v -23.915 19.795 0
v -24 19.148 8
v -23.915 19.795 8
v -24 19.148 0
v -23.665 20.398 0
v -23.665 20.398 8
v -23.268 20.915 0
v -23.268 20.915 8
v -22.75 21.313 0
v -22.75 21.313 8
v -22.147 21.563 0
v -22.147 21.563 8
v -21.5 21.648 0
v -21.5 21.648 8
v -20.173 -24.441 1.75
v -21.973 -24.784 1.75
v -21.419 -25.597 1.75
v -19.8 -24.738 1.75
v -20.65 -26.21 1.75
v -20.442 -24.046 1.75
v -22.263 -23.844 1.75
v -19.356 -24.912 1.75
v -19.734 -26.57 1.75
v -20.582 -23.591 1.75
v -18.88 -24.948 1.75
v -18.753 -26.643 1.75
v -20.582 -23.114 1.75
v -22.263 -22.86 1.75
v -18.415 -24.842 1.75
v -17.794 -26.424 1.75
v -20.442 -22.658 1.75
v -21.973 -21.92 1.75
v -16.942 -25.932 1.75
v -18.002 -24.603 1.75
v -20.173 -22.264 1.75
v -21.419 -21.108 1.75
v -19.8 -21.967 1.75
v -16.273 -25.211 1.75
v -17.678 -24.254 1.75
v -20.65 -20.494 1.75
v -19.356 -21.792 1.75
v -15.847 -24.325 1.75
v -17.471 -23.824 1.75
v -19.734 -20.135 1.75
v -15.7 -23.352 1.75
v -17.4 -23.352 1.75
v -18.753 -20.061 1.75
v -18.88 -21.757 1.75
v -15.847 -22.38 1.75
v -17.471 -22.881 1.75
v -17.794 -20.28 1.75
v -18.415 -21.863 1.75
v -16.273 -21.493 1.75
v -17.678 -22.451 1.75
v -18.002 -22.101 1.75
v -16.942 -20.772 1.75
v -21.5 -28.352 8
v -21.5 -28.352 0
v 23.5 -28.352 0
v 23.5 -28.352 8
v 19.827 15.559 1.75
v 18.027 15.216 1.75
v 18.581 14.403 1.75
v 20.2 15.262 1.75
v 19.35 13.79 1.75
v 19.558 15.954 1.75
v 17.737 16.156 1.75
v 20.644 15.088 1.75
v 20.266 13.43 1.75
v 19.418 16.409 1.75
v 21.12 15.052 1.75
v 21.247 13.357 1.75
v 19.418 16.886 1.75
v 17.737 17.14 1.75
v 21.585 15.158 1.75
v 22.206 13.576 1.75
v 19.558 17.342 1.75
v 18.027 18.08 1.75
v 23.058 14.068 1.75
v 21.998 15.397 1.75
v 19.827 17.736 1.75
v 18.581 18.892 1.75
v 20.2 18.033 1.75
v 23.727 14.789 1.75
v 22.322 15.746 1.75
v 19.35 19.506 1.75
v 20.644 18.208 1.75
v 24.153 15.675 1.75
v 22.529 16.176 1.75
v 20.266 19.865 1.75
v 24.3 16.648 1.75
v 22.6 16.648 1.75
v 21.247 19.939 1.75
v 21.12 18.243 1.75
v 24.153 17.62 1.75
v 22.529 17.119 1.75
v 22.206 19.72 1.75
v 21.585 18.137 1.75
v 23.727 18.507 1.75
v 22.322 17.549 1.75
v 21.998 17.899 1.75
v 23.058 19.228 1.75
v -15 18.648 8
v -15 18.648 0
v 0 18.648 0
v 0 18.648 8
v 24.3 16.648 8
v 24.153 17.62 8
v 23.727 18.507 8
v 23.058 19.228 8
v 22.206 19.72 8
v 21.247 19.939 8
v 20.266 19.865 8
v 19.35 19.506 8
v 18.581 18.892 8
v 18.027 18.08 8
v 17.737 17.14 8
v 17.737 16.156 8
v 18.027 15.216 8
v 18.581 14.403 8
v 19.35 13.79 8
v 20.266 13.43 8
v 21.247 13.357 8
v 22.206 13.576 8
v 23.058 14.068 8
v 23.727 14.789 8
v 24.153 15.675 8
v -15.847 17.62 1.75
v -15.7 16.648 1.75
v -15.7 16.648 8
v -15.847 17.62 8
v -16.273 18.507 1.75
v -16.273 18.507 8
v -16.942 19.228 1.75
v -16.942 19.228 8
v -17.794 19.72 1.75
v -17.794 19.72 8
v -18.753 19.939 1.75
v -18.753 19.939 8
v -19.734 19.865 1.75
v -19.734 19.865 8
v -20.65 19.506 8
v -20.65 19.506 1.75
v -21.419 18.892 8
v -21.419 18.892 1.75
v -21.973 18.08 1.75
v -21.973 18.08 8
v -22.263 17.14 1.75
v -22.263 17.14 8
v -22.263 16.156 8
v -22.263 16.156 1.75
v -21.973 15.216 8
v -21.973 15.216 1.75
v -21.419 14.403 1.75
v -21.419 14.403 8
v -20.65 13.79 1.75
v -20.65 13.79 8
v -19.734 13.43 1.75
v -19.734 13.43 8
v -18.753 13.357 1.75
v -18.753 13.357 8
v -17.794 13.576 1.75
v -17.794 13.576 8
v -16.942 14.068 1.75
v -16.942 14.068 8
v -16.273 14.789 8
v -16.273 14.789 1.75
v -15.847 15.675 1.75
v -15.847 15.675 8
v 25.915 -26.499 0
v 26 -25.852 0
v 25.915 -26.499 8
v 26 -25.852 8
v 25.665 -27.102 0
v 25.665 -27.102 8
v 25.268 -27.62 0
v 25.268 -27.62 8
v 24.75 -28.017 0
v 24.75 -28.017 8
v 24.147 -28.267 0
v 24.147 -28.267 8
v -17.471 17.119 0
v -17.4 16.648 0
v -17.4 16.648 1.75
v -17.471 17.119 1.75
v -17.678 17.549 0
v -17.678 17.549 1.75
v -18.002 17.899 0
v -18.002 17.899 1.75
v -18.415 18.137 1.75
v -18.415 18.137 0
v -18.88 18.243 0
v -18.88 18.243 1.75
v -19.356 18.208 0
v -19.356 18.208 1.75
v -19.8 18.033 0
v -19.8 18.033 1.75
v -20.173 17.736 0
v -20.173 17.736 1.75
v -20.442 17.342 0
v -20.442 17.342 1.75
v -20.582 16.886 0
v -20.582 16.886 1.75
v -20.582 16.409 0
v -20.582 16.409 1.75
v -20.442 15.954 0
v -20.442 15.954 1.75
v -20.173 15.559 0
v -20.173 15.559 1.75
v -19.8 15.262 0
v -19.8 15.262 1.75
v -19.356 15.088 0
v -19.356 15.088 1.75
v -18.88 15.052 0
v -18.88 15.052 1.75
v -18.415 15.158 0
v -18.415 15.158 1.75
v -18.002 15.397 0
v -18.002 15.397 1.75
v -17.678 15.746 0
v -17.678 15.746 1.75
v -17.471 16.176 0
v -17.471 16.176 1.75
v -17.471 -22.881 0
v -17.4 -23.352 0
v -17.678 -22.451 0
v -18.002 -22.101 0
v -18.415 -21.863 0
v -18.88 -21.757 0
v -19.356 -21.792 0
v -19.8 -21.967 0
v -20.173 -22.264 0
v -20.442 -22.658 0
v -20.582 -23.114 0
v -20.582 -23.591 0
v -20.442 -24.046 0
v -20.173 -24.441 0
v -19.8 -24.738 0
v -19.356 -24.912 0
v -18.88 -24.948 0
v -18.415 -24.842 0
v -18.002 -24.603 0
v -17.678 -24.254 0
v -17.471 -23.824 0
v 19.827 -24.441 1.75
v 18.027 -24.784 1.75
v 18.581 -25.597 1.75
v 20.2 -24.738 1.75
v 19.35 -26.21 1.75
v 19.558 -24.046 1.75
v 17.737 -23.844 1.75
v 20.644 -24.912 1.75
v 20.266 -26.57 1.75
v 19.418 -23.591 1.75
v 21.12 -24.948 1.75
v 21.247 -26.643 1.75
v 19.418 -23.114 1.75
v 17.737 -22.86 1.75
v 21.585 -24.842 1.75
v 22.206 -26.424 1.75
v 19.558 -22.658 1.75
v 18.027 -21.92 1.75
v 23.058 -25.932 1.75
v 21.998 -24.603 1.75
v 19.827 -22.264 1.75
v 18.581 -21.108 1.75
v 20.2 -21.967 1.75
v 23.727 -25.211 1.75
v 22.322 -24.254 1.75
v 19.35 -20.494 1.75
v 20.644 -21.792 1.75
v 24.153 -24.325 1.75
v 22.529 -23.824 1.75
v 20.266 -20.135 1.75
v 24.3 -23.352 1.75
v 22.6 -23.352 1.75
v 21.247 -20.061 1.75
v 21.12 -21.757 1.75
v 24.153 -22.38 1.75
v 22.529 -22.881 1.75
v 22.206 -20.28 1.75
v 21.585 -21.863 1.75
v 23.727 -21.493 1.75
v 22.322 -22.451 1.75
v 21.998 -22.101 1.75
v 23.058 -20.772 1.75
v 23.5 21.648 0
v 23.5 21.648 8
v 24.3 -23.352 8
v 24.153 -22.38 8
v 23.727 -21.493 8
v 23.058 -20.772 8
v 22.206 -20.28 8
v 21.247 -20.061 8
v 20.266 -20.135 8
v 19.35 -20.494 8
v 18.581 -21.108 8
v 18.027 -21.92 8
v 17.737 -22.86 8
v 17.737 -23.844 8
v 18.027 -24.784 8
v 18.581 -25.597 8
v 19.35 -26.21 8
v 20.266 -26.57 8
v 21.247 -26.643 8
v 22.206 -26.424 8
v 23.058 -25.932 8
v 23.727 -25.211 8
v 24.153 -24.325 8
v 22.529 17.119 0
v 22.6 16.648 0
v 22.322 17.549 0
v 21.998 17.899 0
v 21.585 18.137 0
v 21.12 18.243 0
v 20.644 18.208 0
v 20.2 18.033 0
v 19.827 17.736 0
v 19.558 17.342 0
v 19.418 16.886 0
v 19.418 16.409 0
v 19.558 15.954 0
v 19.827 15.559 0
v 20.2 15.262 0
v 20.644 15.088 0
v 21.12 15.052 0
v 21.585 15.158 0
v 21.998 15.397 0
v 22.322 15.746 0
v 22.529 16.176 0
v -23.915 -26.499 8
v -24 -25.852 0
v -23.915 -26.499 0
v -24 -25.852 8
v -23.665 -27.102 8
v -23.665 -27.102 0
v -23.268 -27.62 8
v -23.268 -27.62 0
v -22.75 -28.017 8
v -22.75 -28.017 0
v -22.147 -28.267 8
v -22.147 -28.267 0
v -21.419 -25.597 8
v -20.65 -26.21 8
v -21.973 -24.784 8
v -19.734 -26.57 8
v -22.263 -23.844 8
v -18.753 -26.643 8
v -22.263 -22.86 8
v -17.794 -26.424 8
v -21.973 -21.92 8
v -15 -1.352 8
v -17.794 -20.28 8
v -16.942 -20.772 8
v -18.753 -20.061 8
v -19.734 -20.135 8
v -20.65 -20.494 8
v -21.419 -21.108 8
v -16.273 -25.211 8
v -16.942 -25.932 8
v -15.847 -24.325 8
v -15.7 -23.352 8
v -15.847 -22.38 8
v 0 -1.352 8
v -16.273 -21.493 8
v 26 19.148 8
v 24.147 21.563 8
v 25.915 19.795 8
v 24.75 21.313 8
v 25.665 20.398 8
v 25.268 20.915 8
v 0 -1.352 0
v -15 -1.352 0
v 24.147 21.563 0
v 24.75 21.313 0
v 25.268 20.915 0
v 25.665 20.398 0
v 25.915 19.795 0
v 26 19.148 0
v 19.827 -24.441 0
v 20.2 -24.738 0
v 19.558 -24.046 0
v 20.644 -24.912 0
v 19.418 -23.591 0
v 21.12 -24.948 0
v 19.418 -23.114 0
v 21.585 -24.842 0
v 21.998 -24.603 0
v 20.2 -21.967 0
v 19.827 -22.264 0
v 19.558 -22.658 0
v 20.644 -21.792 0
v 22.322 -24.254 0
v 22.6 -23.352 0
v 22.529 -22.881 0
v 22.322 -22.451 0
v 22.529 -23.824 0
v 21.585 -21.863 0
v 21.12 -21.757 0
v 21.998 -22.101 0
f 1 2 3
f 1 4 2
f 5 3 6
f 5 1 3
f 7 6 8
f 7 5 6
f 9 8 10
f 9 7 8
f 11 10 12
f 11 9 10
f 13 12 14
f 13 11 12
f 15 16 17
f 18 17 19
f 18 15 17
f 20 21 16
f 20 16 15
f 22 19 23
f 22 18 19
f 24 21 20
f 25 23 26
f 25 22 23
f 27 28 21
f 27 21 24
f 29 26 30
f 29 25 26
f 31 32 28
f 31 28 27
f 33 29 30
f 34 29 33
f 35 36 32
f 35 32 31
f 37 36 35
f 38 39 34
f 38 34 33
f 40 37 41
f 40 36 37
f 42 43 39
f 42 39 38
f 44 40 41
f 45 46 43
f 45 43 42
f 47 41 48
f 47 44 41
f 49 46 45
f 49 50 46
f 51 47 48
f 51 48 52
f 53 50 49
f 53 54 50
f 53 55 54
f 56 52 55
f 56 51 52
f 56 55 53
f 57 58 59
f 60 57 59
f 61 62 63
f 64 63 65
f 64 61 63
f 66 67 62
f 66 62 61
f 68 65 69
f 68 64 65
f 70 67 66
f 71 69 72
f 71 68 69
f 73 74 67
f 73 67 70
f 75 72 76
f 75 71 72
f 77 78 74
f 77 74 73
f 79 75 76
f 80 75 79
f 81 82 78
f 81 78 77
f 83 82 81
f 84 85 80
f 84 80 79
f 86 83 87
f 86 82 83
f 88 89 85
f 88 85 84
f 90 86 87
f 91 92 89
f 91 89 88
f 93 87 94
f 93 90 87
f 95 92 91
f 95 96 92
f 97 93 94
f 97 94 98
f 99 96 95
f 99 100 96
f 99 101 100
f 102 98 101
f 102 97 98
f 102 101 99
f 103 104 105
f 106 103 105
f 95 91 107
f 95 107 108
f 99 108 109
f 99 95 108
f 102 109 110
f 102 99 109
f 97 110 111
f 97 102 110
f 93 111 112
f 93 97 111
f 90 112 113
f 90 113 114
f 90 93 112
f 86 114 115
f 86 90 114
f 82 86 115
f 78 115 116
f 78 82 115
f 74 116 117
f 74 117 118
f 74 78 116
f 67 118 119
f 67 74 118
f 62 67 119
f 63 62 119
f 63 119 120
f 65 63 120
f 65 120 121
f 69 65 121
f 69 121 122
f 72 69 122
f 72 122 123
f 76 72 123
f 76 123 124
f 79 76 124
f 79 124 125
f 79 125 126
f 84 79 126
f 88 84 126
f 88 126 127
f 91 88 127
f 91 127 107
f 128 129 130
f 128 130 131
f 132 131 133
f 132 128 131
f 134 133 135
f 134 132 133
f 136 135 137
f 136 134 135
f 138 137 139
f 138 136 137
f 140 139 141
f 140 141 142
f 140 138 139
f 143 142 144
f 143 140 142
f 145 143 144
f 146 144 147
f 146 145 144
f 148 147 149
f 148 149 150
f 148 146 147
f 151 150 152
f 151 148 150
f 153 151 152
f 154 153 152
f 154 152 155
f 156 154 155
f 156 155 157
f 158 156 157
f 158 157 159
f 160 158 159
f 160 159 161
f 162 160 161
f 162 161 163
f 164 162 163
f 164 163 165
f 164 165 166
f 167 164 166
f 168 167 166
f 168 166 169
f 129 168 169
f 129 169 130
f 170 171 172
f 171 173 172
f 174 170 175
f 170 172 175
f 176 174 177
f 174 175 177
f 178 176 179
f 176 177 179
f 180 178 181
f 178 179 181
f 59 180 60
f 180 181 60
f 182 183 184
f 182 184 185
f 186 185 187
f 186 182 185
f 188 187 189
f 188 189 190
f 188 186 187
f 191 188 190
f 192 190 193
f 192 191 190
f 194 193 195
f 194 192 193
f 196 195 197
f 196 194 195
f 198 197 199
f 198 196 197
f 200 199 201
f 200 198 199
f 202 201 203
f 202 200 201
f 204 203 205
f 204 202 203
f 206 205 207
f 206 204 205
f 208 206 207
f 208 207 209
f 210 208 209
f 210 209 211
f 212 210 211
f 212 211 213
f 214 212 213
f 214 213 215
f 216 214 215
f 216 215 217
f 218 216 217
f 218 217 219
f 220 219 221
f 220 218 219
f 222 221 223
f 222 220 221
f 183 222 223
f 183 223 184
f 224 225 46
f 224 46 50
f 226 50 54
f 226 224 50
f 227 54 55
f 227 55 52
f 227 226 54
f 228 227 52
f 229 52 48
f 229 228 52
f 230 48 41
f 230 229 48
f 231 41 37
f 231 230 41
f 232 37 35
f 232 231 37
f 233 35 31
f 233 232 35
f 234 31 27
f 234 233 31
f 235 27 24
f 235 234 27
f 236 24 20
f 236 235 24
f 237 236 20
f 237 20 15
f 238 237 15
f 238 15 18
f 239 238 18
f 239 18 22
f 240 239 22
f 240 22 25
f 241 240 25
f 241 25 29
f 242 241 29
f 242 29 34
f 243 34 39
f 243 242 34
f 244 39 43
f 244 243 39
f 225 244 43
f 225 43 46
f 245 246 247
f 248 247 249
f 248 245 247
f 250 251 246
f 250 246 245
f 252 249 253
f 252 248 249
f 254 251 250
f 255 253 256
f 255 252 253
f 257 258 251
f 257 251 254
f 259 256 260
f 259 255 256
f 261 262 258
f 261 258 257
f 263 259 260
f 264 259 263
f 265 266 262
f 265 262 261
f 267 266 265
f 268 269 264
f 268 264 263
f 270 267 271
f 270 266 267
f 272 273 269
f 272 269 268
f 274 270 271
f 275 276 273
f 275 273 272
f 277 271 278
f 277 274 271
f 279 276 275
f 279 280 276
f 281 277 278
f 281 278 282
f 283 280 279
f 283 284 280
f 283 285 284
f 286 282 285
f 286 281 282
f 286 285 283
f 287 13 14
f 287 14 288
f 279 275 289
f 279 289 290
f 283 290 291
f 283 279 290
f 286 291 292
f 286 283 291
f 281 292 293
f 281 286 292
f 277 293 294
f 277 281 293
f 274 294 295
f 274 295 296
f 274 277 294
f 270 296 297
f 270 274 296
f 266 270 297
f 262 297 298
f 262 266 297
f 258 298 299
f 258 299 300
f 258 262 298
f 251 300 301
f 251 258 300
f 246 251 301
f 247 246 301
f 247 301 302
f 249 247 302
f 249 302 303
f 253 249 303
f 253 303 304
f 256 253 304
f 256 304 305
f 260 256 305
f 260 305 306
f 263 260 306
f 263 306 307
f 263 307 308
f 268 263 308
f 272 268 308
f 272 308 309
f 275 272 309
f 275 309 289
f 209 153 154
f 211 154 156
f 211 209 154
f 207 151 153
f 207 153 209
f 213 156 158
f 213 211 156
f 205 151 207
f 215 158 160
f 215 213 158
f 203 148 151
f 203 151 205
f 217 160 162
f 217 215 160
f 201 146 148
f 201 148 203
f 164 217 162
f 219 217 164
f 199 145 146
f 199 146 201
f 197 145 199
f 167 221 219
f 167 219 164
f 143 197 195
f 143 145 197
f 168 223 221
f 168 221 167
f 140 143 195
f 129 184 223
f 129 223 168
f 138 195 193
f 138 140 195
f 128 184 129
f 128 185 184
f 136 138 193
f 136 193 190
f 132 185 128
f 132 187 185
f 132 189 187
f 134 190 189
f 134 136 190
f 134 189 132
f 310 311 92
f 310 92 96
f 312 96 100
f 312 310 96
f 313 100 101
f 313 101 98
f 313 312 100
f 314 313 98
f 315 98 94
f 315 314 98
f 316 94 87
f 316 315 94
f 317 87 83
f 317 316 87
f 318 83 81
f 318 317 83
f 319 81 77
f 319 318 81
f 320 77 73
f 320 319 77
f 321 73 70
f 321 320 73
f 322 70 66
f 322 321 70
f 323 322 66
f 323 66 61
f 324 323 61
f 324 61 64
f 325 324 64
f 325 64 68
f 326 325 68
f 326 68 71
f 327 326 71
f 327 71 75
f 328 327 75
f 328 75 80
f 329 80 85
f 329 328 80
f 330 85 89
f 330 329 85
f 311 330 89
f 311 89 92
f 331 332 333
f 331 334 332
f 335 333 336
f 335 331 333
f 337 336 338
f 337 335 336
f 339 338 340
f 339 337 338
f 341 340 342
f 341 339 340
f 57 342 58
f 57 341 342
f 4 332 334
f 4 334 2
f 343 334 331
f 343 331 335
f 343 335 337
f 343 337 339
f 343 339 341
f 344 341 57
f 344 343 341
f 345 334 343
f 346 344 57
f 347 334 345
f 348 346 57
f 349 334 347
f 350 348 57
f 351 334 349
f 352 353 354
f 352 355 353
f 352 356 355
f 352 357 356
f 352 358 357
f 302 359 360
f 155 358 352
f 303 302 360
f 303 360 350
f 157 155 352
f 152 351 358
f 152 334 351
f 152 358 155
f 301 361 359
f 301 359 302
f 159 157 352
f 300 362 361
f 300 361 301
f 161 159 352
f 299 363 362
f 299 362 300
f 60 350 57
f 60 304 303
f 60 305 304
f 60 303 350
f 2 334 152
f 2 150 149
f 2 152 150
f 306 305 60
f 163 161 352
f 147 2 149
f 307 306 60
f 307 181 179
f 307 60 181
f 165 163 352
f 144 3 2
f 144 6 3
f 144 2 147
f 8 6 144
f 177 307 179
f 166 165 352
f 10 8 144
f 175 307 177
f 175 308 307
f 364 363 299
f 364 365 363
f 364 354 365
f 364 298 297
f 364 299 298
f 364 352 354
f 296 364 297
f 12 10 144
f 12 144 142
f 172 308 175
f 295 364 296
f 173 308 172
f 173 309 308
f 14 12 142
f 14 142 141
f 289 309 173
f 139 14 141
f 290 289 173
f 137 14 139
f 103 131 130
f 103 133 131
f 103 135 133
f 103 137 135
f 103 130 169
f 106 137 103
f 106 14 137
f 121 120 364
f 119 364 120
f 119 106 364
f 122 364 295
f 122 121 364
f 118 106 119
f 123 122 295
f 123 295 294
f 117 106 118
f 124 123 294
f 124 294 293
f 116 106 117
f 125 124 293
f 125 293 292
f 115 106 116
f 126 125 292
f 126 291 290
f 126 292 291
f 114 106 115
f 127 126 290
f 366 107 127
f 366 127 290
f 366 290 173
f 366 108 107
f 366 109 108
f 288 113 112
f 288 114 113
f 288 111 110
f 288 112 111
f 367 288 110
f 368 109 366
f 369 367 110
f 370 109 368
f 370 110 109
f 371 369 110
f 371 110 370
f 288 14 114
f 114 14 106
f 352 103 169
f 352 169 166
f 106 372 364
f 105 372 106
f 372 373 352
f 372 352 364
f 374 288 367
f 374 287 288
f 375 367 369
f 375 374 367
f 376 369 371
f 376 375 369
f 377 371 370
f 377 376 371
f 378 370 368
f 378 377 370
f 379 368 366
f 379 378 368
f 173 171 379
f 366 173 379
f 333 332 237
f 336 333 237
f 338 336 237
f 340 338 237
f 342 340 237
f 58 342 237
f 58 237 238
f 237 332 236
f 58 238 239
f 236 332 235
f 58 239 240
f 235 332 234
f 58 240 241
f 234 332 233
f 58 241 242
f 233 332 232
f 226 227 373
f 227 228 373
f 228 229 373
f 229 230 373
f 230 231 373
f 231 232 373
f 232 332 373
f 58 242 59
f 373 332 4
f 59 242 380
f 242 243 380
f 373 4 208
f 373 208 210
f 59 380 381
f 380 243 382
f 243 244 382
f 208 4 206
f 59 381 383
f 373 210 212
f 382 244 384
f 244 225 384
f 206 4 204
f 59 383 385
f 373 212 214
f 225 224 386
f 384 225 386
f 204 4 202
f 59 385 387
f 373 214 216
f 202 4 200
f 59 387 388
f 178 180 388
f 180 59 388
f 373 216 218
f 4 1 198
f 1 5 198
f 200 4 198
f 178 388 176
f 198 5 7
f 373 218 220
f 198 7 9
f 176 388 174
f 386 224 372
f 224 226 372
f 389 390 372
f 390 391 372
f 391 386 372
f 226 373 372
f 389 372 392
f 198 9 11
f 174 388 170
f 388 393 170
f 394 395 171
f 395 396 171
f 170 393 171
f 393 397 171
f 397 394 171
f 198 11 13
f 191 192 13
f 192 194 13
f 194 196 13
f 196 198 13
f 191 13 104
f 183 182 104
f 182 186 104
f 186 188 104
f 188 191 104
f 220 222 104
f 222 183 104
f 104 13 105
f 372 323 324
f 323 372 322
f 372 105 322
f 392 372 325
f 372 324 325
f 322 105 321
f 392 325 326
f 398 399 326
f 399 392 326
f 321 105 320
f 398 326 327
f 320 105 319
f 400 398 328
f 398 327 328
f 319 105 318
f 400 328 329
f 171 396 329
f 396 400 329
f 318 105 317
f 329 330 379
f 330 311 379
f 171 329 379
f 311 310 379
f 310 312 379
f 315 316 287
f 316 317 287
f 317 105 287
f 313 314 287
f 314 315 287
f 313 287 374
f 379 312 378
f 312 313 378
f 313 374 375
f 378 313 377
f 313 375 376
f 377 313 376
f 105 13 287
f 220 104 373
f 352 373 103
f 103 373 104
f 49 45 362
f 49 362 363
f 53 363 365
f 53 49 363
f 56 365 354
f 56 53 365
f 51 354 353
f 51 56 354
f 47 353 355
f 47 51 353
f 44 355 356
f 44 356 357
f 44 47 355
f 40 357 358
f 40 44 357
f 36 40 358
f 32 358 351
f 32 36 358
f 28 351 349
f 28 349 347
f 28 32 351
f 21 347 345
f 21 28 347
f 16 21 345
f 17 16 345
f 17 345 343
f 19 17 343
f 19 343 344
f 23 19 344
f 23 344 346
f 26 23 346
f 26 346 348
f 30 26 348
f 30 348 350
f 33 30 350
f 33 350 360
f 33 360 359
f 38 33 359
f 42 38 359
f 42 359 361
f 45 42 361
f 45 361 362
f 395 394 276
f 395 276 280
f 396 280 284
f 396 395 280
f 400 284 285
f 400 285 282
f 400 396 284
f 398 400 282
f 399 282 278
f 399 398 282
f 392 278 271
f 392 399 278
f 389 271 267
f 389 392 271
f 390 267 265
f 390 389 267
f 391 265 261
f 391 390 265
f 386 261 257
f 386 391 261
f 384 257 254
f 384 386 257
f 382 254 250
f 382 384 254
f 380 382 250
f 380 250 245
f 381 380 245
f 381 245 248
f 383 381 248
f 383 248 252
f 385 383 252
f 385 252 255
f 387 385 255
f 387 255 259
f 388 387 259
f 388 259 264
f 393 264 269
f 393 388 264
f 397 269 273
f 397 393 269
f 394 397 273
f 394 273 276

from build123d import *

# Parameters (mm, degrees)
F0_W     = 50
F0_H     = 50
F0_R     = 3.3
F0_W_2   = 15
F0_H_2   = 20
F1_DEPTH = 8
F0_R_2   = 1.6
F2_DEPTH = 1.75
F3_R     = 2.5


with BuildPart() as f1:
    # F0 (on Top) → F1 (new body)
    with BuildSketch(Plane.XY):
        with Locations((1, -3.352269)):
            Rectangle(F0_W, F0_H)
        with Locations((-19, -23.352269)):
            Circle(F0_R, mode=Mode.SUBTRACT)
        with Locations((21, -23.352269)):
            Circle(F0_R, mode=Mode.SUBTRACT)
        with Locations((-7.5, 8.647731)):
            Rectangle(F0_W_2, F0_H_2, mode=Mode.SUBTRACT)
        with Locations((-19, 16.647731)):
            Circle(F0_R, mode=Mode.SUBTRACT)
        with Locations((21, 16.647731)):
            Circle(F0_R, mode=Mode.SUBTRACT)
    extrude(amount=F1_DEPTH)

    # F0 (on Top) → F2 (join)
    with BuildSketch(Plane.XY):
        with Locations((1, -3.352269)):
            Rectangle(F0_W, F0_H)
        with Locations((-19, -23.352269)):
            Circle(F0_R, mode=Mode.SUBTRACT)
        with Locations((21, -23.352269)):
            Circle(F0_R, mode=Mode.SUBTRACT)
        with Locations((-7.5, 8.647731)):
            Rectangle(F0_W_2, F0_H_2, mode=Mode.SUBTRACT)
        with Locations((-19, 16.647731)):
            Circle(F0_R, mode=Mode.SUBTRACT)
        with Locations((21, 16.647731)):
            Circle(F0_R, mode=Mode.SUBTRACT)
        with Locations((21, 16.647731)):
            Circle(F0_R)
        with Locations((21, 16.647731)):
            Circle(F0_R_2, mode=Mode.SUBTRACT)
        with Locations((-19, 16.647731)):
            Circle(F0_R)
        with Locations((-19, 16.647731)):
            Circle(F0_R_2, mode=Mode.SUBTRACT)
        with Locations((-19, -23.352269)):
            Circle(F0_R)
        with Locations((-19, -23.352269)):
            Circle(F0_R_2, mode=Mode.SUBTRACT)
        with Locations((21, -23.352269)):
            Circle(F0_R)
        with Locations((21, -23.352269)):
            Circle(F0_R_2, mode=Mode.SUBTRACT)
    extrude(amount=F2_DEPTH)

    # F3
    f3_edges = [f1.edges().sort_by_distance(p)[0] for p in [
        (-24, 21.647731, 4),
        (26, 21.647731, 4),
        (26, -28.352269, 4),
        (-24, -28.352269, 4),
    ]]
    fillet(f3_edges, radius=F3_R)


solid = f1.part
